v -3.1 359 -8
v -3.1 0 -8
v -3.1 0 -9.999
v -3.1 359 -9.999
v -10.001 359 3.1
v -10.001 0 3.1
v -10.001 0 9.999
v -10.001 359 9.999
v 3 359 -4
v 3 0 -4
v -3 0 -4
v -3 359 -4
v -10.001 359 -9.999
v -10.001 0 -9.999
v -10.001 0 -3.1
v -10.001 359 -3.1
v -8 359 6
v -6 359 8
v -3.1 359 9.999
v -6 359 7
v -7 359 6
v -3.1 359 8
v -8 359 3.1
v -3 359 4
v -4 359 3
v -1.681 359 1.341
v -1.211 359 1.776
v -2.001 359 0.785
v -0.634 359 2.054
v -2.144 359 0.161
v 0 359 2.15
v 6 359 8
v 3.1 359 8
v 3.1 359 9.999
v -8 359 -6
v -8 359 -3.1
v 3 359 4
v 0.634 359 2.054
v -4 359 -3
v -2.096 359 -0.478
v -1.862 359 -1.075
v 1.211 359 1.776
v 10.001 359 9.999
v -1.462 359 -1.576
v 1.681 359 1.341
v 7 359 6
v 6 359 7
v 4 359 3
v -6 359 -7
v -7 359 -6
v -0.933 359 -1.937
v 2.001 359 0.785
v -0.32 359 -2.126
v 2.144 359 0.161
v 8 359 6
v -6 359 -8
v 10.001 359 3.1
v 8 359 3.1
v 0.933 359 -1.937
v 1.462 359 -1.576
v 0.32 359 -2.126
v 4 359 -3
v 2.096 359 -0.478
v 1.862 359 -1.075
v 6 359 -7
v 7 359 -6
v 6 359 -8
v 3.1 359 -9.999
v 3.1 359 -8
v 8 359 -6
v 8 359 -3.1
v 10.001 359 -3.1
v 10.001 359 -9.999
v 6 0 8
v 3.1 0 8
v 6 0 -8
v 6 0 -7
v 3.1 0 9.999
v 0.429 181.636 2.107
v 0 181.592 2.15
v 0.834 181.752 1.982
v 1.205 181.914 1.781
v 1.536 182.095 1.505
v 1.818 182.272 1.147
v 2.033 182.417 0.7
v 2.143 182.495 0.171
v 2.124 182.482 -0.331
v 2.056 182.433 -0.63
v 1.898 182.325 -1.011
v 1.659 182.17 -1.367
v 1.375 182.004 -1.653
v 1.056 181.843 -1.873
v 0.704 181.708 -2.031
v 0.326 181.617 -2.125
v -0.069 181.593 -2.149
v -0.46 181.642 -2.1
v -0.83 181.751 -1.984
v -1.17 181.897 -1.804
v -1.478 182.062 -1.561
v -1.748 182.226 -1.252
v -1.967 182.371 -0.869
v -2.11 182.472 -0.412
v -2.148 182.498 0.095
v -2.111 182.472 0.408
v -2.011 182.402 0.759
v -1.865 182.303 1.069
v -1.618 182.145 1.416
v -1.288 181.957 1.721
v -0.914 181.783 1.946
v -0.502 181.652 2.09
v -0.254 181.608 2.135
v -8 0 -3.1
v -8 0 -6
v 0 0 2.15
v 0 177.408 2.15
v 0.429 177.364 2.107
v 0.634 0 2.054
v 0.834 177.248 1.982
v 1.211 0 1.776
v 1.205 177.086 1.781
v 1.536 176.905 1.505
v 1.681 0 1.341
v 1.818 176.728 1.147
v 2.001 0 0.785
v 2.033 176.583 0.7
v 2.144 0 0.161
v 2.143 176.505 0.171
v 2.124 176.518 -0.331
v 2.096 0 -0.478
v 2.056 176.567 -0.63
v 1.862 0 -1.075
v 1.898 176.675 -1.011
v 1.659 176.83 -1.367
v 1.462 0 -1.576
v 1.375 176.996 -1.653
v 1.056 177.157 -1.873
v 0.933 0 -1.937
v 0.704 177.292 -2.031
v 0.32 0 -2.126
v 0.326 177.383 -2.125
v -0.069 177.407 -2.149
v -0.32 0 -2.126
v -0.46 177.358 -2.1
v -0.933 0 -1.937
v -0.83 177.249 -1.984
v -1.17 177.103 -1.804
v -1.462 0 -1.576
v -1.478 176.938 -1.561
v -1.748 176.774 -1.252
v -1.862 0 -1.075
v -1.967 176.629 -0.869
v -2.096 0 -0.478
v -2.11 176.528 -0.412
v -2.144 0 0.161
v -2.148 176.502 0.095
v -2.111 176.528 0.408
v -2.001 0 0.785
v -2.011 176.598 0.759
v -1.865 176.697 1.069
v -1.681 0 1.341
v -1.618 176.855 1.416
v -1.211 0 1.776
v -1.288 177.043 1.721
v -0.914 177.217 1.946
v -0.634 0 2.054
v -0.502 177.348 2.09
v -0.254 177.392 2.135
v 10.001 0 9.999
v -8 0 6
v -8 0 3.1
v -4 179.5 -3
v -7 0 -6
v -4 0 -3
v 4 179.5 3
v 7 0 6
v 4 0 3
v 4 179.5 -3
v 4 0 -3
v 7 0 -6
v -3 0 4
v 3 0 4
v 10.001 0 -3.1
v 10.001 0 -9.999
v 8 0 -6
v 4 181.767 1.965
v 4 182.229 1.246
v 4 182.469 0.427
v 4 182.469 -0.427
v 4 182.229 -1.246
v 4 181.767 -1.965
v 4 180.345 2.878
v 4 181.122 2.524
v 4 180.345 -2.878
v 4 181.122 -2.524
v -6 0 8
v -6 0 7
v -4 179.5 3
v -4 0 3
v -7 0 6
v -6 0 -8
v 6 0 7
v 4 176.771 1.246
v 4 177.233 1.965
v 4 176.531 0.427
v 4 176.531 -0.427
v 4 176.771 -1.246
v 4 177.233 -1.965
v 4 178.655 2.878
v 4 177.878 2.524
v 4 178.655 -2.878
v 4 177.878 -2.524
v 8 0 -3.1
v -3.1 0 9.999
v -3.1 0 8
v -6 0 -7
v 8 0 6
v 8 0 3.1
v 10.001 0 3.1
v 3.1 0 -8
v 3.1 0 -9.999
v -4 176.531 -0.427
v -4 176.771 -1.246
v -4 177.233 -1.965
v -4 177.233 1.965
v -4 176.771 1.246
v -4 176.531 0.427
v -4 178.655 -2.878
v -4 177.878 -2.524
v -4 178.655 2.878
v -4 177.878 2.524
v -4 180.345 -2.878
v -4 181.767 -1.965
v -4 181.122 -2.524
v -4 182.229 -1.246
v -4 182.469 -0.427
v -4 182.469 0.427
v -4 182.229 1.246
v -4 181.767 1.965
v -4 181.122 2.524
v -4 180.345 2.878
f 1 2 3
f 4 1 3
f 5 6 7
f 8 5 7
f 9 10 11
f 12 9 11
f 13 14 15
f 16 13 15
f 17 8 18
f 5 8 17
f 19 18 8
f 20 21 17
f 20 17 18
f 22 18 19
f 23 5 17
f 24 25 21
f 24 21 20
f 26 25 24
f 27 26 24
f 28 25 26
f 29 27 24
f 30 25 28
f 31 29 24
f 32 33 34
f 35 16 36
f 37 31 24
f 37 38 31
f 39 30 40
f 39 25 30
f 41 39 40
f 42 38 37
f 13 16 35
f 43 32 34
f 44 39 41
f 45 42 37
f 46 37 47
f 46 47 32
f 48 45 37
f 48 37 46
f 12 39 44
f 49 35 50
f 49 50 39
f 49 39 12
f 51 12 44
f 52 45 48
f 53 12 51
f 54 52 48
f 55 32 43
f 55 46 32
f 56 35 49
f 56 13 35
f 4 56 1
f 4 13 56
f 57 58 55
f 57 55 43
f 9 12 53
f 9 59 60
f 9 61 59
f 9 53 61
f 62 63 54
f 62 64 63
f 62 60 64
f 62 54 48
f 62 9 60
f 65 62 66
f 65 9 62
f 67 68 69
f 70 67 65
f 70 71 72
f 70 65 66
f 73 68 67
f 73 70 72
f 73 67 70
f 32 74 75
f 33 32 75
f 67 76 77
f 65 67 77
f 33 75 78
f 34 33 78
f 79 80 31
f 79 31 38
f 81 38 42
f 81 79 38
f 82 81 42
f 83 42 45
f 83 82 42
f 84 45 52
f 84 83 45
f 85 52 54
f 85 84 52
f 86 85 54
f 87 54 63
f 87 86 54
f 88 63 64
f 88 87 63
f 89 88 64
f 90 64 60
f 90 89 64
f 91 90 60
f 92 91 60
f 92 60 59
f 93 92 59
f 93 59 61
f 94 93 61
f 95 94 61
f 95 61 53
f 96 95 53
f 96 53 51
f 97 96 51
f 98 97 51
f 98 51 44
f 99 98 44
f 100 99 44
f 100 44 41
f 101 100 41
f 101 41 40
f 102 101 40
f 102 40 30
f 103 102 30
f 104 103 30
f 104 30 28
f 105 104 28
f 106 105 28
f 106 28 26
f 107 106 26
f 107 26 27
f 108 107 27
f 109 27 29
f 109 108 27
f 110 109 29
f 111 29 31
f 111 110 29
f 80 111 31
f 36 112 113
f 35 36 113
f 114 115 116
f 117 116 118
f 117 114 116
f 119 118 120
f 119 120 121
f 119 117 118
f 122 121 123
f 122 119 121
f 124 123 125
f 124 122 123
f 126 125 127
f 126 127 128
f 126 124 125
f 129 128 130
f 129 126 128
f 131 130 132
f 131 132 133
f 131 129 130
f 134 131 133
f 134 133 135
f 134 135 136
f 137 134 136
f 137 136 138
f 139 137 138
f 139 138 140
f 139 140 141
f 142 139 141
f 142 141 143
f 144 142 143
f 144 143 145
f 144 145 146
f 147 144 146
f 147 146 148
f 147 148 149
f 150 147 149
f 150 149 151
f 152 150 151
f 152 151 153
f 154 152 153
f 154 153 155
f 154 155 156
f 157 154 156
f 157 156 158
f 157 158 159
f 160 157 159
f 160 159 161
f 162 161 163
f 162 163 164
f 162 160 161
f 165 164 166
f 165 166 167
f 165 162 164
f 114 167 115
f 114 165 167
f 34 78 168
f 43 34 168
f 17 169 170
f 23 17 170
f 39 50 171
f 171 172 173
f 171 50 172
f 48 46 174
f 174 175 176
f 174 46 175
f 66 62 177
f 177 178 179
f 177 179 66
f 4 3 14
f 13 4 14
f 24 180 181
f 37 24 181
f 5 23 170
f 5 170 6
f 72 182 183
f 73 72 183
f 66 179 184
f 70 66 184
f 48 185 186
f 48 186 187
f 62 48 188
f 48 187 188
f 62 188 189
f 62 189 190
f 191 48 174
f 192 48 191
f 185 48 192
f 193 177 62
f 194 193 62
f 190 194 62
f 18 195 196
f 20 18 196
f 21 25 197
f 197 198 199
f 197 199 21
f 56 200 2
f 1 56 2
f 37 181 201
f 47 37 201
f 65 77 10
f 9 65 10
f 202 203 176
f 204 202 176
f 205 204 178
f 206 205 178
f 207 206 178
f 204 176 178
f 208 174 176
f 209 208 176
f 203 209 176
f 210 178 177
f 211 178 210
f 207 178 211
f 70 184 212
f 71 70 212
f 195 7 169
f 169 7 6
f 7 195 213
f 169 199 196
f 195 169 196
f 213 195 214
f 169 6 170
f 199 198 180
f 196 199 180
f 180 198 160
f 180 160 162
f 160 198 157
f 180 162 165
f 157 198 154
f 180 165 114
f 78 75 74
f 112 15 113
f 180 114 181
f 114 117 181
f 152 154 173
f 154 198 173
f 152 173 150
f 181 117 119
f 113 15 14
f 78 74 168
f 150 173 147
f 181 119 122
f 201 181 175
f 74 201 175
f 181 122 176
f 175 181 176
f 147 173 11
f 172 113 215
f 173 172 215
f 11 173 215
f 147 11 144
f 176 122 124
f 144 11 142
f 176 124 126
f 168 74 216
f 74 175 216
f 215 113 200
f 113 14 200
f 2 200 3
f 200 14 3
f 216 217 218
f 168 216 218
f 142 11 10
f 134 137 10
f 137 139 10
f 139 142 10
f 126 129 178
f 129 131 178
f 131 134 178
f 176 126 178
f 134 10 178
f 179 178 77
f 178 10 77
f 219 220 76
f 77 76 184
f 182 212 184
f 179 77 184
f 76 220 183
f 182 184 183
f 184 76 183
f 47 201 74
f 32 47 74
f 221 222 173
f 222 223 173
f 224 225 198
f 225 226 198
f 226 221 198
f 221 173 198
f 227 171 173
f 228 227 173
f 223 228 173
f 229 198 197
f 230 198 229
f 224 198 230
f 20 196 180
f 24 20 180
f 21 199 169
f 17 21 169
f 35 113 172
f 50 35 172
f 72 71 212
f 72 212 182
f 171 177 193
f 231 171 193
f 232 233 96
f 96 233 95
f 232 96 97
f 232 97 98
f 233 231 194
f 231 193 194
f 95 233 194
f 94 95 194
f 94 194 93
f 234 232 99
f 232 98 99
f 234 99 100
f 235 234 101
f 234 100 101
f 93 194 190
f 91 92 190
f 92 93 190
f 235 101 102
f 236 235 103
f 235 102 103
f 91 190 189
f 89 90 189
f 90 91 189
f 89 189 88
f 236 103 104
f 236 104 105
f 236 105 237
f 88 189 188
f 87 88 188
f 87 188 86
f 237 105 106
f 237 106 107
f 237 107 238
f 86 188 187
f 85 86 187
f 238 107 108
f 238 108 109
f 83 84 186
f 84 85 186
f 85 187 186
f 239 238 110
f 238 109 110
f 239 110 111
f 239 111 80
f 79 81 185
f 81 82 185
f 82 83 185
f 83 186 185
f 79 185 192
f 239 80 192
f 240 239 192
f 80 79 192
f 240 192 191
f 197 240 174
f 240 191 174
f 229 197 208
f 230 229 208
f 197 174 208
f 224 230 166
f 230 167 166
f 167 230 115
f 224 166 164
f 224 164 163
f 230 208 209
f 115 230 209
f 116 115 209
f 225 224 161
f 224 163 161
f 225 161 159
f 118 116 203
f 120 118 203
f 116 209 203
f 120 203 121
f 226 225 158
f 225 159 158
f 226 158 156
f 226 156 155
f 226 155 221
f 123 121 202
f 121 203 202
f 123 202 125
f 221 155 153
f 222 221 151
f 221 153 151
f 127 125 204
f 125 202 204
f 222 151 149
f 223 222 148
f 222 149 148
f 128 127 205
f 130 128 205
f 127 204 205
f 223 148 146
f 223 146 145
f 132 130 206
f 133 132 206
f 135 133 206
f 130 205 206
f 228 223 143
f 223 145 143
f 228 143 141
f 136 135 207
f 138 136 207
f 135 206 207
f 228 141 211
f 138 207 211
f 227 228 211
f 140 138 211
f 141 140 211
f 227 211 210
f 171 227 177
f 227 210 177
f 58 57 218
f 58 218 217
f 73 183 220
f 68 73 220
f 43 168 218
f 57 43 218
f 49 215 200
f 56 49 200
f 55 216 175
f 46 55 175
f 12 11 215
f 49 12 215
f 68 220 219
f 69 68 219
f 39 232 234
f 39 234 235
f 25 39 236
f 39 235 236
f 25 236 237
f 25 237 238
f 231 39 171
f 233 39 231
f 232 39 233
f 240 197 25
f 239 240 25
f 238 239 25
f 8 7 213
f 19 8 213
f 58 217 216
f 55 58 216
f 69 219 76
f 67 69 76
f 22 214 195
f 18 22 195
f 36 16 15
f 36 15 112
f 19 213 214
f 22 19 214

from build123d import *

# Parameters (mm, degrees)
SKETCH_1_R          = 2.15
EXTRUDE_1_DEPTH     = 359
SKETCH_3_R          = 3
CUT_EXTRUDE_1_DEPTH = 26


with BuildPart() as part:
    # 스케치1 → 보스-돌출1 (new body)
    with BuildSketch(Plane(origin=(0, 0, 0), x_dir=(1, 0, 0), z_dir=(0, 1, 0))):
        Polygon((3.1, 8), (6, 8), (6, 7), (3, 4), (0, 4), (-3, 4), (-6, 7), (-6, 8), (-3.1, 8), (-3.1, 9.998992087), (-10.001007855, 9.998992087), (-10.001007855, 3.1), (-8, 3.1), (-8, 6), (-7, 6), (-4, 3), (-4, 0), (-4, -3), (-7, -6), (-8, -6), (-8, -3.1), (-10.001007855, -3.1), (-10.001007855, -9.998992087), (-3.1, -9.998992087), (-3.1, -8), (-6, -8), (-6, -7), (-3, -4), (0, -4), (3, -4), (6, -7), (6, -8), (3.1, -8), (3.1, -9.998992087), (10.001007855, -9.998992087), (10.001007855, -3.1), (8, -3.1), (8, -6), (7, -6), (4, -3), (4, 0), (4, 3), (7, 6), (8, 6), (8, 3.1), (10.001007855, 3.1), (10.001007855, 9.998992087), (3.1, 9.998992087), align=None)
        with Locations(Location((0, 0, 0), (0, 0, 270))):
            Circle(SKETCH_1_R, mode=Mode.SUBTRACT)
    extrude(amount=EXTRUDE_1_DEPTH)

    # 스케치3 → 컷-돌출1 (cut)
    with BuildSketch(Plane(origin=(10.001007855, 0, 0), x_dir=(0, 0, -1), z_dir=(1, 0, 0))):
        with Locations((0, 179.5)):
            Circle(SKETCH_3_R)
    extrude(amount=-CUT_EXTRUDE_1_DEPTH, mode=Mode.SUBTRACT)


solid = part.part
